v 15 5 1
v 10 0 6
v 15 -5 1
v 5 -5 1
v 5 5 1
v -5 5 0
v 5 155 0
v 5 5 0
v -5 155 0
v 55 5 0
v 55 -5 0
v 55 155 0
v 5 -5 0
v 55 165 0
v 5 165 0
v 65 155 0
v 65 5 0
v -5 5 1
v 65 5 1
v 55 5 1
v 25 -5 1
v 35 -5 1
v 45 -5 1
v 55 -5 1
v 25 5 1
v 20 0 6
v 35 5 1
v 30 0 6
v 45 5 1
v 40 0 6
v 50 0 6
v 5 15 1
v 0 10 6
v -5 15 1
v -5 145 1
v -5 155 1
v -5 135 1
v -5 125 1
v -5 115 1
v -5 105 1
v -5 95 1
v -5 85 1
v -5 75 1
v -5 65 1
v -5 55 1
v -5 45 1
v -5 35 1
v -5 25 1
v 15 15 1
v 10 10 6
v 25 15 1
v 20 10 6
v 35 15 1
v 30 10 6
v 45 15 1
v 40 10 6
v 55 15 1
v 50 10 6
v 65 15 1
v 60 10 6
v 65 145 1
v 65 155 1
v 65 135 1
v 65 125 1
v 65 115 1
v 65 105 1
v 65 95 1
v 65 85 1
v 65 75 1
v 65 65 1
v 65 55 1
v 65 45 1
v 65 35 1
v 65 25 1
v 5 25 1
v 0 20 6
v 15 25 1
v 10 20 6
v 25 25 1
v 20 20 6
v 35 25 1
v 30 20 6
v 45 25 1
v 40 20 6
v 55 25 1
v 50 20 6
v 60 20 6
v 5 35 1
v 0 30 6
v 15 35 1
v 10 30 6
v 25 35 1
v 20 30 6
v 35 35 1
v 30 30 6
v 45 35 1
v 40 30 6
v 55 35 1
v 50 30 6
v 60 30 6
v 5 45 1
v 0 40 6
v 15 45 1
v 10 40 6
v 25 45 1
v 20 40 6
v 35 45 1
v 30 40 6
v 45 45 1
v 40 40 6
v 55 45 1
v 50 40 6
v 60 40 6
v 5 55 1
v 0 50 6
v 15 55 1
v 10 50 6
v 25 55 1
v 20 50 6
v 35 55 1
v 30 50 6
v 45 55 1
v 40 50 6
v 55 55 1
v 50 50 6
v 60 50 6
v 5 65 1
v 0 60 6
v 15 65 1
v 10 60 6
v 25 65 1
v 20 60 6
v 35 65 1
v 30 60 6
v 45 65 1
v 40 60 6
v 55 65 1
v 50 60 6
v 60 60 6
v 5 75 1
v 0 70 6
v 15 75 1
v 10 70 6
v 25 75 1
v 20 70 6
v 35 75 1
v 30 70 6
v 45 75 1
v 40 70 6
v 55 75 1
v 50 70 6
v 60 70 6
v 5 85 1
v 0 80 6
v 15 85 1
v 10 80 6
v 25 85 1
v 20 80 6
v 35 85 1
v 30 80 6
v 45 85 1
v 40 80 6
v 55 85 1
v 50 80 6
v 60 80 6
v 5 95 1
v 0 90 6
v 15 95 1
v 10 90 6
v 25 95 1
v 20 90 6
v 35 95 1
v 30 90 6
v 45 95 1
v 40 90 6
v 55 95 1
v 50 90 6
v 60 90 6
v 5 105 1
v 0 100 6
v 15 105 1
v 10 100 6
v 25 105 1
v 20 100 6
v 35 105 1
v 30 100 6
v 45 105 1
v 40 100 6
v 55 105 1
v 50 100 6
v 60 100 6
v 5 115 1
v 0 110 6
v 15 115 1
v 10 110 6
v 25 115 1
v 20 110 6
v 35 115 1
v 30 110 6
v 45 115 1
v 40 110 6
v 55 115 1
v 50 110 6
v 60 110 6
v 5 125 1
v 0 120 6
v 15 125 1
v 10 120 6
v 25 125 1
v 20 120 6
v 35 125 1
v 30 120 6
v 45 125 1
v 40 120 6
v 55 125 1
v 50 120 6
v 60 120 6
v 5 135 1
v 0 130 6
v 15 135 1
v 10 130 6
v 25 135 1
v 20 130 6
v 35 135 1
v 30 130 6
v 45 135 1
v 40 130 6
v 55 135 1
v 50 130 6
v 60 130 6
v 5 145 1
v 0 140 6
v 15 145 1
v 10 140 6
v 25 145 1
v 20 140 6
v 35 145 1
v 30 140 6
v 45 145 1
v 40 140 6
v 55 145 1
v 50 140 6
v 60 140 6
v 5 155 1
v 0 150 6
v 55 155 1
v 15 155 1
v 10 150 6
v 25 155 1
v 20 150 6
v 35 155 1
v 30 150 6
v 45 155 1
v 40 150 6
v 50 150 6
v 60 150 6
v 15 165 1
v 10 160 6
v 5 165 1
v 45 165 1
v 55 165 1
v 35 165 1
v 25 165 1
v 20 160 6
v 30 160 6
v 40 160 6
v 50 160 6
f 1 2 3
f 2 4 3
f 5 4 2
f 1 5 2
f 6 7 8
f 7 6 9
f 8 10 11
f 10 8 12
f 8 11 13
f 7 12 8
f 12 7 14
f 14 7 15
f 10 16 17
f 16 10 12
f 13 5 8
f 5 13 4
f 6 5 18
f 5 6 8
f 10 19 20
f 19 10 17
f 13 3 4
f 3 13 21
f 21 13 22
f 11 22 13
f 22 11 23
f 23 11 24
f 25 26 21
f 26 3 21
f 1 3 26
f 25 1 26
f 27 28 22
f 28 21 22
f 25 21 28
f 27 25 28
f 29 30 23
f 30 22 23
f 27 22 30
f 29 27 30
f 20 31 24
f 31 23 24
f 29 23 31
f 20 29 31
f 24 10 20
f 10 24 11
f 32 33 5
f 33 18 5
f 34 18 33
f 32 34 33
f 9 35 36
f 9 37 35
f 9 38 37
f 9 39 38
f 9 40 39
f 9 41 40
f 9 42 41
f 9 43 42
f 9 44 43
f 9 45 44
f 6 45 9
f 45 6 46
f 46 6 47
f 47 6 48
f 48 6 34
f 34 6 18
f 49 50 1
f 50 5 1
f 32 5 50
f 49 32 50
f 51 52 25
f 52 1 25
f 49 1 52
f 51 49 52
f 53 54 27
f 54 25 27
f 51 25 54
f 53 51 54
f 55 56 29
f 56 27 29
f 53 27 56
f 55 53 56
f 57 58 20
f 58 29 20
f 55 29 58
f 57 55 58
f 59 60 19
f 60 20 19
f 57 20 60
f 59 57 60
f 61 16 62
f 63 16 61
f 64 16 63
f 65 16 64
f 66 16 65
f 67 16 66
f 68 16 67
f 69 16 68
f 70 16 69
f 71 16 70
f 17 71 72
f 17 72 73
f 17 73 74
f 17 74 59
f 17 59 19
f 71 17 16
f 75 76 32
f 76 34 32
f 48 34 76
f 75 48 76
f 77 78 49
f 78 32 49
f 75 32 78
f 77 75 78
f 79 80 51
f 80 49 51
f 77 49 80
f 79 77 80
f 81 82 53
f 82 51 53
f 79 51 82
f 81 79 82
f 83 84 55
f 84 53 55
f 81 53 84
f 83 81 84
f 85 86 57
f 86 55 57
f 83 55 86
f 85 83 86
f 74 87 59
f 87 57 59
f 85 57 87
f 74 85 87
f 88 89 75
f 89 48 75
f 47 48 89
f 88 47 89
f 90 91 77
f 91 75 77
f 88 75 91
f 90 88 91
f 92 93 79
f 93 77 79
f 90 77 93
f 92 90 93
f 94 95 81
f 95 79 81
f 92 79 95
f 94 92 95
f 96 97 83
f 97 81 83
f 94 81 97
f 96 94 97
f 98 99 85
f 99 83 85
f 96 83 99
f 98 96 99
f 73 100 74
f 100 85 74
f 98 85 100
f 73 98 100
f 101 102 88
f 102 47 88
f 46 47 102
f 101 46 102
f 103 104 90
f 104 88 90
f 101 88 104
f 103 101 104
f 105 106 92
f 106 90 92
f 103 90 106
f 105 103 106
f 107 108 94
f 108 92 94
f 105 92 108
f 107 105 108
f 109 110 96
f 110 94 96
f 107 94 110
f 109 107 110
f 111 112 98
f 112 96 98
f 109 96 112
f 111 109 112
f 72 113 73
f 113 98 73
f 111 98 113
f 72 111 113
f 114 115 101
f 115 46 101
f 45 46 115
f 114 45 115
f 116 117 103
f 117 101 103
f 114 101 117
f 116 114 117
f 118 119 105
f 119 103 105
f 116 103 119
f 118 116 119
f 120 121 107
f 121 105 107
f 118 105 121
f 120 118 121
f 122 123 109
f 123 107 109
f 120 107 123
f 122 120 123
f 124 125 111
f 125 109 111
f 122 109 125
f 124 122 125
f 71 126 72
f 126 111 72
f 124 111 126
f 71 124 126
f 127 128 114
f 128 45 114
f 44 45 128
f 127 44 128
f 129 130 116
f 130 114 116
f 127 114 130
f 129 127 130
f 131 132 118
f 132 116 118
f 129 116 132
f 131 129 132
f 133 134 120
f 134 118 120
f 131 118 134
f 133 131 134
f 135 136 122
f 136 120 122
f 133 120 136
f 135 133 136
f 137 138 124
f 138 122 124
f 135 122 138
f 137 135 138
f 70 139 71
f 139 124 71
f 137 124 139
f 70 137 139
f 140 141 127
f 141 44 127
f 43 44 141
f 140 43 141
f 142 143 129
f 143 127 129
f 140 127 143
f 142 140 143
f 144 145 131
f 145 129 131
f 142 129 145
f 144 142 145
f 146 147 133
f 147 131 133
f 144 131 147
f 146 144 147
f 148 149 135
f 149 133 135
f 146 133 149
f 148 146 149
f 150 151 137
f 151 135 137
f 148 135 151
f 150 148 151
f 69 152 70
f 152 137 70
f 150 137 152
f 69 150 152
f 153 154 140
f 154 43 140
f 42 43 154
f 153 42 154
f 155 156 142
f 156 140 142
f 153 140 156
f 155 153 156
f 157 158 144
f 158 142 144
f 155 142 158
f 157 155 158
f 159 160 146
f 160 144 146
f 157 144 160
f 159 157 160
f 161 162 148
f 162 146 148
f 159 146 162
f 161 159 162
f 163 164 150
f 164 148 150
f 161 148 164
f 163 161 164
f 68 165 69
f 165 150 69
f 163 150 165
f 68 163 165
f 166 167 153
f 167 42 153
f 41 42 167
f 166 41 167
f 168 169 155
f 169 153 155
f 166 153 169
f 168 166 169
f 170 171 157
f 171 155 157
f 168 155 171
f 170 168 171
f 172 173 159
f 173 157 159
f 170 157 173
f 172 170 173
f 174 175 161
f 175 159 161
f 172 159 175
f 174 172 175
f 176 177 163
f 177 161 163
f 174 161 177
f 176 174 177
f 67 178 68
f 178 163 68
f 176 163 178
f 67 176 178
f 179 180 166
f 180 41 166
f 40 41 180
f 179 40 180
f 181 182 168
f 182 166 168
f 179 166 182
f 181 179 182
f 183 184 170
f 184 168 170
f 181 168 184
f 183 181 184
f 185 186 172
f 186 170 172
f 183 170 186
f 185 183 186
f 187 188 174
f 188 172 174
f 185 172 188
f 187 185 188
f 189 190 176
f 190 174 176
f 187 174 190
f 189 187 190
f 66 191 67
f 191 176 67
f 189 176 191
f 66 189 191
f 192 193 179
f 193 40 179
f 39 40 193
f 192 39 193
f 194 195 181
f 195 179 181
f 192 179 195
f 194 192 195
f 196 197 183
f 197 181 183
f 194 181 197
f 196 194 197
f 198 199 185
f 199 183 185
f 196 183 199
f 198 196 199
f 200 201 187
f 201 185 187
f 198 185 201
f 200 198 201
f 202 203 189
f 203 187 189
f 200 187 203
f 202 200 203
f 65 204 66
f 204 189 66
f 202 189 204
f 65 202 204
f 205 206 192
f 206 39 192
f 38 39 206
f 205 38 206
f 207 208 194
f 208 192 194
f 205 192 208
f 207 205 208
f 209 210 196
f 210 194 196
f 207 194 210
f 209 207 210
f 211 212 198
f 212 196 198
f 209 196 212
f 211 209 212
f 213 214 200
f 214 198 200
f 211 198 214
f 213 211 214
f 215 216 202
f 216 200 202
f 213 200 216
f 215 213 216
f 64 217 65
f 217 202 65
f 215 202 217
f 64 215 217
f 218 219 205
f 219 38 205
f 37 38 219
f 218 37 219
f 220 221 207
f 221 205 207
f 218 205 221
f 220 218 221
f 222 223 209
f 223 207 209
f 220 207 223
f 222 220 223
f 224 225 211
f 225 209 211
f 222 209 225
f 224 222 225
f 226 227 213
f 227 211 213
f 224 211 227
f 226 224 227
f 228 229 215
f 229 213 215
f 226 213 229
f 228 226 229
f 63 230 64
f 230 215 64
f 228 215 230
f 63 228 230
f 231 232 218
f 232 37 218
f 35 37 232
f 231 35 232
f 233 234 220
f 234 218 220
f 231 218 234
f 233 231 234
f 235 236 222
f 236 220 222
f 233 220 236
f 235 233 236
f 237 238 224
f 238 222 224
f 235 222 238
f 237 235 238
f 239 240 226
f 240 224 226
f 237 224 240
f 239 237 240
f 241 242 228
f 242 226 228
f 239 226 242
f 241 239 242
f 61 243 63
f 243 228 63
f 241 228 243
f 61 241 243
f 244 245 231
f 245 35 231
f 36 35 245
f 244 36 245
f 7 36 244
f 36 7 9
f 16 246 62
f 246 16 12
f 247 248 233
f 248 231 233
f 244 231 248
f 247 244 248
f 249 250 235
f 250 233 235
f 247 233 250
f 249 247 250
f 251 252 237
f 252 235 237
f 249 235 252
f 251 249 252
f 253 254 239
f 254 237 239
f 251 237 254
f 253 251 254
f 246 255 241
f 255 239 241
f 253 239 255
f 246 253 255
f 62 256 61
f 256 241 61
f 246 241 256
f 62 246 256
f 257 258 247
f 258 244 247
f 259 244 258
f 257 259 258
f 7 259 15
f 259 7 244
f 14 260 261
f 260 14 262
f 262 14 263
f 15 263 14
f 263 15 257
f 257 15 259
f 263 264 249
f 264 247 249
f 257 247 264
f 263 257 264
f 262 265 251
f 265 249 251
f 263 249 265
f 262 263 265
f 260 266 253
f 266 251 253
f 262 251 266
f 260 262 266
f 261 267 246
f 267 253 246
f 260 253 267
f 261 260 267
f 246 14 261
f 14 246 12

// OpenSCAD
// 82mm x 184mm

spikew = 10;
spikeh = 5;

baseplate = 1;


grid = [
        [0, 1, 1, 1, 1, 1, 0],
        [1, 1, 1, 1, 1, 1, 1],
        [1, 1, 1, 1, 1, 1, 1],
        [1, 1, 1, 1, 1, 1, 1],
        [1, 1, 1, 1, 1, 1, 1],
        [1, 1, 1, 1, 1, 1, 1],
        [1, 1, 1, 1, 1, 1, 1],
        [1, 1, 1, 1, 1, 1, 1],
        [1, 1, 1, 1, 1, 1, 1],
        [1, 1, 1, 1, 1, 1, 1],
        [1, 1, 1, 1, 1, 1, 1],
        [1, 1, 1, 1, 1, 1, 1],
        [1, 1, 1, 1, 1, 1, 1],
        [1, 1, 1, 1, 1, 1, 1],
        [1, 1, 1, 1, 1, 1, 1],
        [1, 1, 1, 1, 1, 1, 1],
        [0, 1, 1, 1, 1, 1, 0]
       ];


//grid = [[1]];

module spike() {
    translate([0,0,baseplate]){
        polyhedron(
            points = [[-spikew/2,  spikew/2, 0],
                      [ spikew/2,  spikew/2, 0],
                      [-spikew/2, -spikew/2, 0],
                      [ spikew/2, -spikew/2, 0],
                      [0, 0, spikeh]],
            faces = [[0, 2, 3, 1],
                     [4, 2, 0],
                     [4, 3, 2],
                     [4, 1, 3],
                     [4, 0, 1]]);
    }
    translate([-spikew/2, -spikew/2, 0]){
        cube([spikew, spikew, baseplate]);
    }
}

for (row = [ 0 : len(grid) - 1]){
    line = grid[row];
    for (col = [ 0 : len(line) - 1]){
            if(line[col]){
            translate([spikew*col,spikew*row,0]){
                spike();
            }
        }
    }
}
    
